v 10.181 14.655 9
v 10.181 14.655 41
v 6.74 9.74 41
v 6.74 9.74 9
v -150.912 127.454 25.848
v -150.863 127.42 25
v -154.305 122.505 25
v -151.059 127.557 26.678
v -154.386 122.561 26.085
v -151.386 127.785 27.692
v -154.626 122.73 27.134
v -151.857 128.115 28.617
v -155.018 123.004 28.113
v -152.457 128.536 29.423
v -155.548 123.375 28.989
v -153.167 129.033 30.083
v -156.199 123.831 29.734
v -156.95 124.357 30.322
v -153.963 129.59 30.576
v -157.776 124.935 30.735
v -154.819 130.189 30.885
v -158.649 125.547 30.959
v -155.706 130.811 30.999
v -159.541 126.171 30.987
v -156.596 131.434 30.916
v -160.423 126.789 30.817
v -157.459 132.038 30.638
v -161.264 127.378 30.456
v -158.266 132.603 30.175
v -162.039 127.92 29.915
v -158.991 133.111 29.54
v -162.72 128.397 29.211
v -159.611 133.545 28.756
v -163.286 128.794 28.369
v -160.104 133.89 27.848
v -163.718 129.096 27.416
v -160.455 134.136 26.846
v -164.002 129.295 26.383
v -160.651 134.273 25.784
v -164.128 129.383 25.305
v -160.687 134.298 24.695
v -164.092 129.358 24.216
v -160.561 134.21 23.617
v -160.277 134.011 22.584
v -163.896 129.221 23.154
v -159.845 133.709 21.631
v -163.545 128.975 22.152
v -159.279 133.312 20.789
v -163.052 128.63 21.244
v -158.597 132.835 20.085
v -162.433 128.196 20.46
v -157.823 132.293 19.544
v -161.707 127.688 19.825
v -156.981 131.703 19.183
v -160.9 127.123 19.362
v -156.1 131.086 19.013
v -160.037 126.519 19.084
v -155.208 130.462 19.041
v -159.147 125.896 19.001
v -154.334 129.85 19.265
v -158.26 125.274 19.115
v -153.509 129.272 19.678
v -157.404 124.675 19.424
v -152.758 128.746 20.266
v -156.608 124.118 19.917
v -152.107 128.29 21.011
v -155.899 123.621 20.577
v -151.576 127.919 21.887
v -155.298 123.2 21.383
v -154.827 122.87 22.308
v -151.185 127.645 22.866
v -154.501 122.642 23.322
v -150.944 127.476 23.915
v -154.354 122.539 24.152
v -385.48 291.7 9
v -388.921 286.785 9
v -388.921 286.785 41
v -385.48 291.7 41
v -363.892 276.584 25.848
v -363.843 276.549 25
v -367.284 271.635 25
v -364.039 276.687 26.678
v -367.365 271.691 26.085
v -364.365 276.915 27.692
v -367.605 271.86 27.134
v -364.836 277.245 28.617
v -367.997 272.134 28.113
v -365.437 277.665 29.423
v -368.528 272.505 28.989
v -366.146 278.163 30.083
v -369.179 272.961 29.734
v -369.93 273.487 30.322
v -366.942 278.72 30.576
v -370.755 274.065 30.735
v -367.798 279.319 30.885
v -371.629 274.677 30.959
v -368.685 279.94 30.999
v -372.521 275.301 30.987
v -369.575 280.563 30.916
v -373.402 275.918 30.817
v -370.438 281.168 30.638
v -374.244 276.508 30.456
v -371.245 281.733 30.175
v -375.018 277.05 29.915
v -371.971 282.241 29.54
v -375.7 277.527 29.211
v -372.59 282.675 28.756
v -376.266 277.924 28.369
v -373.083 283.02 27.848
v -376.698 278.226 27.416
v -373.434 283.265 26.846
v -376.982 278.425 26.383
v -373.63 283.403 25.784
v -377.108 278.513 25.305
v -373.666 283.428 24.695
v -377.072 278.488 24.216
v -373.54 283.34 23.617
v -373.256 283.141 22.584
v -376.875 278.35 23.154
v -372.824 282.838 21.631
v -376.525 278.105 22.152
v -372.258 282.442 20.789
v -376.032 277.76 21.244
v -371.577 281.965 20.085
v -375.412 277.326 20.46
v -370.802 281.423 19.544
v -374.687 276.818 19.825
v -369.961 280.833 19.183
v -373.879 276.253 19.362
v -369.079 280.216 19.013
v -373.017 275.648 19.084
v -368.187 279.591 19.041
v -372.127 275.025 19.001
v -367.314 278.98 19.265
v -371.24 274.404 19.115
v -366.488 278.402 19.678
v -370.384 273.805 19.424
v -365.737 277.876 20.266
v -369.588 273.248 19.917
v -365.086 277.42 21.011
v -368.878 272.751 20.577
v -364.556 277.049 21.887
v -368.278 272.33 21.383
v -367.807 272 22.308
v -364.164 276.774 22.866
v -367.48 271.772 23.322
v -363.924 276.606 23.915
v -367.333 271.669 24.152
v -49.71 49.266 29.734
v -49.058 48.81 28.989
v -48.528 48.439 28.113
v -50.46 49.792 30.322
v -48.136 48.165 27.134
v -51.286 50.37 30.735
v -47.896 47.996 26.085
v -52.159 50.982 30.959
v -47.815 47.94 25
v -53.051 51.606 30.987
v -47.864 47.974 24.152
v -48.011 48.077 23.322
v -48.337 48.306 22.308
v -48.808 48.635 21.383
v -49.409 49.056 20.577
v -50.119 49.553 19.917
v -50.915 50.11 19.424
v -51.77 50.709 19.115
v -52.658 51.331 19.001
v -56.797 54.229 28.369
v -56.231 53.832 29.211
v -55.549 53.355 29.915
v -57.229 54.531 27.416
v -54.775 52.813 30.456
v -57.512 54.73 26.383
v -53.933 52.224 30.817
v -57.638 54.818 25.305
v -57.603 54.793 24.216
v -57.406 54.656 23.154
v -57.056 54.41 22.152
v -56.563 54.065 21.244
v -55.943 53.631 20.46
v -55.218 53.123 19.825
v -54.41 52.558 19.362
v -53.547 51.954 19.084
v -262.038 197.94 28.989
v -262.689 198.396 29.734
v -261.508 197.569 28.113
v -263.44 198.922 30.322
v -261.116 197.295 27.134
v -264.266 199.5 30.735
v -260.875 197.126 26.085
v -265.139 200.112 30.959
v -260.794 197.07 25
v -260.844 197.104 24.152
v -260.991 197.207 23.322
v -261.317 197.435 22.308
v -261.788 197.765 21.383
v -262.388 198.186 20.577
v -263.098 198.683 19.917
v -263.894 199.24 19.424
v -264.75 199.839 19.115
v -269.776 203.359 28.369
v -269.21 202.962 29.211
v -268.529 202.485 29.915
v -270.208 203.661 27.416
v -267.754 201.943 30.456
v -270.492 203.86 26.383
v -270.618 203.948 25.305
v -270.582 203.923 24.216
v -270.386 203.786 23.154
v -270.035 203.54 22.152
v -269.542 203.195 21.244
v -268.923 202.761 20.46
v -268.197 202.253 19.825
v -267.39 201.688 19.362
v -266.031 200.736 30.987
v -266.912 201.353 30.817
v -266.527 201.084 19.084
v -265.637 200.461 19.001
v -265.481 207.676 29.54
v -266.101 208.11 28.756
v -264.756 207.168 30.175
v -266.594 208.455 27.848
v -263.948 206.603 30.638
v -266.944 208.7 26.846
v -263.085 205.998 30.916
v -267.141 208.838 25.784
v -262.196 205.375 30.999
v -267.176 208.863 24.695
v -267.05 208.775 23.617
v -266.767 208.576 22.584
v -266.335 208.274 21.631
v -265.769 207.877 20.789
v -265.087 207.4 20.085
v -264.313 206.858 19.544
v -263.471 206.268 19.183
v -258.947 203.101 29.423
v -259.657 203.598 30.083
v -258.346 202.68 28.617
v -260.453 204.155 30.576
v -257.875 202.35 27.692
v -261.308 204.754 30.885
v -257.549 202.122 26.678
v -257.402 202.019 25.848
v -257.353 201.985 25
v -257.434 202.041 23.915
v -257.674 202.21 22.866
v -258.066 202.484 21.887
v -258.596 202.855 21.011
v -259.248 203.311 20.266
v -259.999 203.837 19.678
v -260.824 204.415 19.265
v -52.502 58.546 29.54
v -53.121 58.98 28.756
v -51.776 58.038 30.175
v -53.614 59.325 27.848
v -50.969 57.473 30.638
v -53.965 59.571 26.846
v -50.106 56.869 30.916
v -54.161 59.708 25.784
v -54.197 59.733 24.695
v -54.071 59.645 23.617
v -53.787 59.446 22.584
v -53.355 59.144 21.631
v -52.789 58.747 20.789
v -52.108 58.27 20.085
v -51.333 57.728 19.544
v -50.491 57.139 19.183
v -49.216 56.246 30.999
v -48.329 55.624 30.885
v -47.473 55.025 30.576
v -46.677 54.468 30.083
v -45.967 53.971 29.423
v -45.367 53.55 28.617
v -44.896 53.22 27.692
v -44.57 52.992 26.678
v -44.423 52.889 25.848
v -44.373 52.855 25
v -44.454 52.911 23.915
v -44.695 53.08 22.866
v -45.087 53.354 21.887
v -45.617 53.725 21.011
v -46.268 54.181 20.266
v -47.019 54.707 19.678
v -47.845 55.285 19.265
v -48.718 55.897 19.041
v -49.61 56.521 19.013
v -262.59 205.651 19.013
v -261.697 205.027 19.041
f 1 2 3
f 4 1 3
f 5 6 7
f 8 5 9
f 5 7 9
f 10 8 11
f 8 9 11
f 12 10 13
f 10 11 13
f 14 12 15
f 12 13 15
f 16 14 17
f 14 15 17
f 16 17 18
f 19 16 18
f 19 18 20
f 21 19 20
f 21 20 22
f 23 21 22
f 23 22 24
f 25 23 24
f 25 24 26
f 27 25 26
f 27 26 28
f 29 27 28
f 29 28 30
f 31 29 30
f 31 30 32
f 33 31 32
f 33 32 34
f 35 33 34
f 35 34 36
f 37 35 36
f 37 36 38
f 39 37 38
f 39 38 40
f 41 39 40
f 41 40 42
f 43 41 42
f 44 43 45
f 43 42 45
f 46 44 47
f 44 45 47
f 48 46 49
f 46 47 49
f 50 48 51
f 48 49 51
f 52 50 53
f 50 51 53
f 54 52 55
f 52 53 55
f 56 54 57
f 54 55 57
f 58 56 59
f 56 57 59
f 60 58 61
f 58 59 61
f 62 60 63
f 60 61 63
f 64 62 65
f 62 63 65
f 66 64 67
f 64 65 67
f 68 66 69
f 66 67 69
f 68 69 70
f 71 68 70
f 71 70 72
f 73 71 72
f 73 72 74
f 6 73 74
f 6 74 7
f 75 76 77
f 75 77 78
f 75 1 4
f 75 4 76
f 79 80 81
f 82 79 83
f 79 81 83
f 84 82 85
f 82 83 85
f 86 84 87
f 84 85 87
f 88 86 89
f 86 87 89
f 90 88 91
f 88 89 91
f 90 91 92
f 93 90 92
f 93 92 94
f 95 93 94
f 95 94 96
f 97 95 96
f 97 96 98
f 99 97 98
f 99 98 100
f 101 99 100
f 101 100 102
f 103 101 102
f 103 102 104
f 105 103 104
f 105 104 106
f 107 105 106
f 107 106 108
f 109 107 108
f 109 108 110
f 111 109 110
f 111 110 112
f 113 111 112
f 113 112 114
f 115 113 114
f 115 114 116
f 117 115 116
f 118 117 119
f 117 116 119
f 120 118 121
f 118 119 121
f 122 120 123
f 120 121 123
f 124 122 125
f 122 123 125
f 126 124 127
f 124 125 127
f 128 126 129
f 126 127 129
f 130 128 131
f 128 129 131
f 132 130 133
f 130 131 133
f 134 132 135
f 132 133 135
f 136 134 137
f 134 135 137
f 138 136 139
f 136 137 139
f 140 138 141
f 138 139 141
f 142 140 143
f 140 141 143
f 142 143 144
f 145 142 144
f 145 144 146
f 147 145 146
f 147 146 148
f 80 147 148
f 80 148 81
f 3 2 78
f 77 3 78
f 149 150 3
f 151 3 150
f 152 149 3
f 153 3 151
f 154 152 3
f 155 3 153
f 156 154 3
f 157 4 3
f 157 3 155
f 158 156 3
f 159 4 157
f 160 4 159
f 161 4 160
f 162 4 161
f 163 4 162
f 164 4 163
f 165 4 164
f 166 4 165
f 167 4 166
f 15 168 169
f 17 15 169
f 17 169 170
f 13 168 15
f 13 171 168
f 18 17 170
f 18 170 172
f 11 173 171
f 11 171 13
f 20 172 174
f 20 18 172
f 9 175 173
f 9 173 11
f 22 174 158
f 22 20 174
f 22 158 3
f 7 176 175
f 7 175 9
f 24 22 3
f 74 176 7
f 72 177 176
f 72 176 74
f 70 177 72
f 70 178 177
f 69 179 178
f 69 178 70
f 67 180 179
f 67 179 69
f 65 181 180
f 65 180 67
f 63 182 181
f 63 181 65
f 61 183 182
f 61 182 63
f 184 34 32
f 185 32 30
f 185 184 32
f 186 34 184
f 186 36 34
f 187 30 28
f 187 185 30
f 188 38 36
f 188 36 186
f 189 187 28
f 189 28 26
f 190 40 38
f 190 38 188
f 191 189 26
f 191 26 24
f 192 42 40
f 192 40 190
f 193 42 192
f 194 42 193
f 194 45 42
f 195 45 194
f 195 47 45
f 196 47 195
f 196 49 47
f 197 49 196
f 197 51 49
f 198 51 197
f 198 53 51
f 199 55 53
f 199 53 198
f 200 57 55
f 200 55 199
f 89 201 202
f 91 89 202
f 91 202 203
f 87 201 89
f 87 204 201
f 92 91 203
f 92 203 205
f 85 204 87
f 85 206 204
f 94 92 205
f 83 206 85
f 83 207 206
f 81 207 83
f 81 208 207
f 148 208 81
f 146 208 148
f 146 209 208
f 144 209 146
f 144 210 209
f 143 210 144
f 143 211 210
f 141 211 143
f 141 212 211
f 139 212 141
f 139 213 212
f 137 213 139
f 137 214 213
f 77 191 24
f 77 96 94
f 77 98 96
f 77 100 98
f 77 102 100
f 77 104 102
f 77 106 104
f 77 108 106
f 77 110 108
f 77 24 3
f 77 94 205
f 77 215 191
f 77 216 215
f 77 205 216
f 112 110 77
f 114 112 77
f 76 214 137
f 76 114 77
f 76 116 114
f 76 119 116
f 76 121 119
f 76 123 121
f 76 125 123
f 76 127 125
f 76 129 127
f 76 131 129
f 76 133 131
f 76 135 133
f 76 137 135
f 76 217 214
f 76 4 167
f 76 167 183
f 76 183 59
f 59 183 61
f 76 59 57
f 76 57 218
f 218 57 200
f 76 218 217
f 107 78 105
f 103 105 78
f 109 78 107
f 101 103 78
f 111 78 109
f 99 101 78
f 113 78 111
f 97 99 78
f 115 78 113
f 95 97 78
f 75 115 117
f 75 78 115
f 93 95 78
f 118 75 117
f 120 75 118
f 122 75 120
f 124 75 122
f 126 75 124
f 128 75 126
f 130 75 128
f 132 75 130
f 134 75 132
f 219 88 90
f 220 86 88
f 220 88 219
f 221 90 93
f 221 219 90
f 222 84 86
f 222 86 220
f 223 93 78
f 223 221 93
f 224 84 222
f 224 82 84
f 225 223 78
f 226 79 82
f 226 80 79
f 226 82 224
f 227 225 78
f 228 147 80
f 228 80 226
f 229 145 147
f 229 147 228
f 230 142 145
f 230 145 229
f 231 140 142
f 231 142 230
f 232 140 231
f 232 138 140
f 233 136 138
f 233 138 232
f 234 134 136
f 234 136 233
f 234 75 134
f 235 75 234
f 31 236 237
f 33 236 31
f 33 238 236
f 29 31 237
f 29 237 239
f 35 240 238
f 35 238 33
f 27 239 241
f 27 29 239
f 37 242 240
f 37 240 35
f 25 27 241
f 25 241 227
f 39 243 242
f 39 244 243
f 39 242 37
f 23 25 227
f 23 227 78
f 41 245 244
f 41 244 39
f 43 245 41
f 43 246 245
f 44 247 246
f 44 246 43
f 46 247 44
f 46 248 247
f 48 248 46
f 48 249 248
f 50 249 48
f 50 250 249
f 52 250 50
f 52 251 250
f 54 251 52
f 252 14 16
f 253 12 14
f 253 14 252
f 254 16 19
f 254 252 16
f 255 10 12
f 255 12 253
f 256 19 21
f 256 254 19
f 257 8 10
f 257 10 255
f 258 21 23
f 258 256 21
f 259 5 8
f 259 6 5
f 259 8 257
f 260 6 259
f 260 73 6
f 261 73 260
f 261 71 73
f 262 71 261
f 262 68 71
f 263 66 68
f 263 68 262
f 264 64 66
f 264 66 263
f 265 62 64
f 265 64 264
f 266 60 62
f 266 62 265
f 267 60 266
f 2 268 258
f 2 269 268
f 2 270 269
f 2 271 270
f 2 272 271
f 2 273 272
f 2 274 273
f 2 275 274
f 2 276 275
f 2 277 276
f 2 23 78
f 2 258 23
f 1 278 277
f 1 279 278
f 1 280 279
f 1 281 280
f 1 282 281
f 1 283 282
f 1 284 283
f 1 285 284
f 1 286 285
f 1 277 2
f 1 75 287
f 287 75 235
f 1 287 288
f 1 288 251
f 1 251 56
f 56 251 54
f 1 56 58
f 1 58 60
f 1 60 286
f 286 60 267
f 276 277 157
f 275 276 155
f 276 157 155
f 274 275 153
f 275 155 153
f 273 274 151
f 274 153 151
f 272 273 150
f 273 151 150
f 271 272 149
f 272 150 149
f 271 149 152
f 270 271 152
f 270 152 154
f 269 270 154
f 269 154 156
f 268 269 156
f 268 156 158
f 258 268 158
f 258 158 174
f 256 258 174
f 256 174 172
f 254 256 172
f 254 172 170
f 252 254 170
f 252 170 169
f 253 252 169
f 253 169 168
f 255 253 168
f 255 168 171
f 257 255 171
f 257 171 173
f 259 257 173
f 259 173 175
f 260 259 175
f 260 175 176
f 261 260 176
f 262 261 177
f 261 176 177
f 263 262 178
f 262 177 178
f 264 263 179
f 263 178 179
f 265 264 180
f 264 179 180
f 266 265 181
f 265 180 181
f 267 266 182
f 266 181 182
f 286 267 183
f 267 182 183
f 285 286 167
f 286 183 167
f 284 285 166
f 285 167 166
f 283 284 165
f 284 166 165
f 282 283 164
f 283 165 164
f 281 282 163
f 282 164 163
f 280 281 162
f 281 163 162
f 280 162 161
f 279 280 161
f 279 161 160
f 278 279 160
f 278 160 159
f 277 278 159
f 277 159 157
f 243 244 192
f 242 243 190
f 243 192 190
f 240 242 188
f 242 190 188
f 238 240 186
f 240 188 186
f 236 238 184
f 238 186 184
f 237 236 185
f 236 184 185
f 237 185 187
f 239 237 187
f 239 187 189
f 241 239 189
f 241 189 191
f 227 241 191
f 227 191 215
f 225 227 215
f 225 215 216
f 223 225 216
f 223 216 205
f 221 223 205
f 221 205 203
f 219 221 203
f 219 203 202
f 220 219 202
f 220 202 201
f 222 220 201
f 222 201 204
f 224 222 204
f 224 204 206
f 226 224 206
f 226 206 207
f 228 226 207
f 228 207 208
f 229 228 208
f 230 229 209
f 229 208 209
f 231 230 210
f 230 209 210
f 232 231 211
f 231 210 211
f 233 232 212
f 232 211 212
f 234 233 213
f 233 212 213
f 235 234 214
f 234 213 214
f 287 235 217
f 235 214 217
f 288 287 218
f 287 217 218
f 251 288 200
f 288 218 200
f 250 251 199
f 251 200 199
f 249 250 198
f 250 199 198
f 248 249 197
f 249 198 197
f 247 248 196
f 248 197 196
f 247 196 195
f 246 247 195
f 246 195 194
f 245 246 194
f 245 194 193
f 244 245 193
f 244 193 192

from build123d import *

# Parameters (mm, degrees)
PAD006_DEPTH           = 32
SKETCH014_R            = 6
POCKET004_DEPTH        = 232.94305
LINEARPATTERN002_COUNT = 4
LINEARPATTERN002_PITCH = 130


with BuildPart() as part:
    # Sketch013 → Pad006 (new body)
    with BuildSketch(Plane.XY):
        Polygon((-385.479931, 291.7), (10.181459, 14.654912), (6.74, 9.74), (-388.92139, 286.785088), align=None)
    extrude(amount=PAD006_DEPTH)

    # Sketch014 (on Face3 of Pad006) → Pocket004 (cut, through all)
    with BuildSketch(Plane(origin=(6.793695, 9.702402, 0), x_dir=(0.819152, -0.573576, 0), z_dir=(-0.573576, -0.819152, 0))):
        with Locations((-462.664681, 16)):
            Circle(SKETCH014_R)
    pocket004 = extrude(amount=-POCKET004_DEPTH, mode=Mode.SUBTRACT)

    # LinearPattern002: Pocket004 ×4
    with Locations(*[Vector(0.819152, -0.573576, 0) * (i * LINEARPATTERN002_PITCH) for i in range(1, LINEARPATTERN002_COUNT)]):
        add(pocket004, mode=Mode.SUBTRACT)


with BuildPart() as part_1:
    # Body005 placement: moved
    add(part.part.moved(Location((0, 0, 9))))


solid = part_1.part
